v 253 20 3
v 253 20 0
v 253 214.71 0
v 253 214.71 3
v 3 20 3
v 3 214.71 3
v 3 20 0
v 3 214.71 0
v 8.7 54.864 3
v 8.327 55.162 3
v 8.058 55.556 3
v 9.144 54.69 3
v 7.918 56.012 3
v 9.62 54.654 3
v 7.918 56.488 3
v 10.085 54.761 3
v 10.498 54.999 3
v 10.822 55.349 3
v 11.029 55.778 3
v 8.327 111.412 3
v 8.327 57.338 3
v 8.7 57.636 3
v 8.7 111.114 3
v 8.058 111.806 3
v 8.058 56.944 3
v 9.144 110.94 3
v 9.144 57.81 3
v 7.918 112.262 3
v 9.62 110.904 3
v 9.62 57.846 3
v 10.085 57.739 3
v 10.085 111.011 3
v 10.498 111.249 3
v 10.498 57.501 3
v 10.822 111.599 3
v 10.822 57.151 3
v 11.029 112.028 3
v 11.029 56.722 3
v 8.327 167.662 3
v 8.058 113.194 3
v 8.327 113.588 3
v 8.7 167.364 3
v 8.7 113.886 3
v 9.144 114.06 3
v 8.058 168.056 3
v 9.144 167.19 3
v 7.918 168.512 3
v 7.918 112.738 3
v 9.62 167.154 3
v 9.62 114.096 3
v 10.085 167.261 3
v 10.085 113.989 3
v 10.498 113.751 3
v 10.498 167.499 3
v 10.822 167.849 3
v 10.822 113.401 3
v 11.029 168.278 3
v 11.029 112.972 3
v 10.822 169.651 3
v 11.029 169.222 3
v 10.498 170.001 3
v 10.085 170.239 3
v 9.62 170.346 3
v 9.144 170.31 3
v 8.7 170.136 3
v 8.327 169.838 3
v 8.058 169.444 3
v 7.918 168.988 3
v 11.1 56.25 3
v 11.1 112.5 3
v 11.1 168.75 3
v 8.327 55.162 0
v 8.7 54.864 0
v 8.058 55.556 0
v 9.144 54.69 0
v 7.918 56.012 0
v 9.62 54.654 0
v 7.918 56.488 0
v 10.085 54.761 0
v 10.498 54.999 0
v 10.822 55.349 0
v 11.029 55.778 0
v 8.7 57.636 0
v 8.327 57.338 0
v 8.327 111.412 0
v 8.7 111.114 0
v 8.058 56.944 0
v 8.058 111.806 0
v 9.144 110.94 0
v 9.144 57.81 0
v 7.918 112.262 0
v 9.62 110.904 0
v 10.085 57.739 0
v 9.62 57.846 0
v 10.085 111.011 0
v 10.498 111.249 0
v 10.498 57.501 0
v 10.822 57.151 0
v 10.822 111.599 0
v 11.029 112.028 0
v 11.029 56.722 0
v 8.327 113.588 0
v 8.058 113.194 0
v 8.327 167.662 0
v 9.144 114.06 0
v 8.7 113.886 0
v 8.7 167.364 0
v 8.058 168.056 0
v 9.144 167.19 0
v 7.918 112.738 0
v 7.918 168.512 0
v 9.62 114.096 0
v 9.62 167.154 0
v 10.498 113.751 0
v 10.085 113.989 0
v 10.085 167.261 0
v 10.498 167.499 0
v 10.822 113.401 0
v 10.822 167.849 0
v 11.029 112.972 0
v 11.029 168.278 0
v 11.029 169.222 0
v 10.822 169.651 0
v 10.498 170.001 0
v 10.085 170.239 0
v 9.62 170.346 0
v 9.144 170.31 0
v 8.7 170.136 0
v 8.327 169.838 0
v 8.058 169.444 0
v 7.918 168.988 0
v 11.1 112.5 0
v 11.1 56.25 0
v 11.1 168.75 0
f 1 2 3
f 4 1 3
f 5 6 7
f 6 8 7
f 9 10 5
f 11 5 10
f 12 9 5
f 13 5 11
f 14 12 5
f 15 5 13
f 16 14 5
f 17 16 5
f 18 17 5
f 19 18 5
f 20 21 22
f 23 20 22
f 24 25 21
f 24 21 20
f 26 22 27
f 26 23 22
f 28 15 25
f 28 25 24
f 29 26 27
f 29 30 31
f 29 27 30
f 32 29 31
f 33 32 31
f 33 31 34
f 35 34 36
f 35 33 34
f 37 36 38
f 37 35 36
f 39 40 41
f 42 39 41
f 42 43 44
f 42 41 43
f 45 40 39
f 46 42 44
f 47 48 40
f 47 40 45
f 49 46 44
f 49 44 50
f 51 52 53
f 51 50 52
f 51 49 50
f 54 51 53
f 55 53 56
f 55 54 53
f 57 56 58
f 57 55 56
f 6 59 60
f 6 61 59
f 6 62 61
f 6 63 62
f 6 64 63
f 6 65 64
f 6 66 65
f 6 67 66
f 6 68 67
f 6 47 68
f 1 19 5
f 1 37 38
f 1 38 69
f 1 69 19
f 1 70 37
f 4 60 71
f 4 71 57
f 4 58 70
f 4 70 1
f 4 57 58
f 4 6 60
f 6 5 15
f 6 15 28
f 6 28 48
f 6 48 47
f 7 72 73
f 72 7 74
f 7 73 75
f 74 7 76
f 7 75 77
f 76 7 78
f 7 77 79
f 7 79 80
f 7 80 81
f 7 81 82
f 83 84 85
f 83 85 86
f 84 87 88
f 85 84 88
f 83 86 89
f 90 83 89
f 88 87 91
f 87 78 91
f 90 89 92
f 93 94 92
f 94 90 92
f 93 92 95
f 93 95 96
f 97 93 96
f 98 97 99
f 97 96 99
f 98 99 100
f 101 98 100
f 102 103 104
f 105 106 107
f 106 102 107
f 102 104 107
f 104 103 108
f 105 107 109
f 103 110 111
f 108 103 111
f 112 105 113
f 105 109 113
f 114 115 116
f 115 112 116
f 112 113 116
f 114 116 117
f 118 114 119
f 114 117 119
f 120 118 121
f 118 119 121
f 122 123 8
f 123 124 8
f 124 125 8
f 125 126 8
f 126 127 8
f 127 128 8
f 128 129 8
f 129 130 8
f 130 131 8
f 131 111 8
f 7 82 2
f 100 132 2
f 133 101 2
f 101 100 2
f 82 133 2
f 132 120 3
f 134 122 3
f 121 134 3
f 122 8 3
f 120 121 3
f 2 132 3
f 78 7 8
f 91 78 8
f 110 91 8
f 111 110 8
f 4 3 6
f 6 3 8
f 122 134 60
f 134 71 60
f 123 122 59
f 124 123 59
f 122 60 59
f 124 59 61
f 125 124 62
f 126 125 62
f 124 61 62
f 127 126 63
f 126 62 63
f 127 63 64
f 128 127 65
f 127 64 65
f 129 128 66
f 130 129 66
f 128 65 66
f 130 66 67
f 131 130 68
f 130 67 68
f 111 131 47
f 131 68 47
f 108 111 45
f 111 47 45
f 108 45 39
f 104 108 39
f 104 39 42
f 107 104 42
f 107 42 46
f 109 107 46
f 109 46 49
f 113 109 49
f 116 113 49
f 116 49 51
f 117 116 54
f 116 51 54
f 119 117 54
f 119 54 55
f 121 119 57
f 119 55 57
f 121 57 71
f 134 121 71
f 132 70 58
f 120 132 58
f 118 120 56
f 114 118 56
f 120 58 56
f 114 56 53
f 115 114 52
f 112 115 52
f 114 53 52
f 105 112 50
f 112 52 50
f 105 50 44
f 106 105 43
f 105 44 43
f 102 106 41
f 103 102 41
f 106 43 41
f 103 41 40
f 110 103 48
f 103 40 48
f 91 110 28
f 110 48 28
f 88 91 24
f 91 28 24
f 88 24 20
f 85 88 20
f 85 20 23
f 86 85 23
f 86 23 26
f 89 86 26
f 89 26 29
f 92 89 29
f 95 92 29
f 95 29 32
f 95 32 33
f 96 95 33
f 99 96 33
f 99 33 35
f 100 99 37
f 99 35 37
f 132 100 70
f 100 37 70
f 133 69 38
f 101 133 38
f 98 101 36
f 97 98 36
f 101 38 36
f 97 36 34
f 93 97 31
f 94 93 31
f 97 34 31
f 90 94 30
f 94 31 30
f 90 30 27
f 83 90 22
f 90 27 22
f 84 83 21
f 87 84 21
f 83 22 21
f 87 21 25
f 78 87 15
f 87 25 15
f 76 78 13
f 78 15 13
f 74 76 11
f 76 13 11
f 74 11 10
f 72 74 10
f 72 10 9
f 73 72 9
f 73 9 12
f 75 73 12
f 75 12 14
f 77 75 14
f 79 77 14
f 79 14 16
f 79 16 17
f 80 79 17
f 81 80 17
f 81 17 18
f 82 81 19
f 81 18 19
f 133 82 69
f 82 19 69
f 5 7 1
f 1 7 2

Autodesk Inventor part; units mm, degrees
ref_plane "YZ Plane" through (0, 0, 0) normal (1, 0, 0) x (0, 1, 0)
ref_plane "XZ Plane" through (0, 0, 0) normal (0, 1, 0) x (-1, 0, 0)
ref_plane "XY Plane" through (0, 0, 0) normal (0, 0, 1) x (1, 0, 0)
ref_plane "Work Plane1" through (0, 0, 0) normal (0, 0, 1) x (1, 0, 0)
sketch "Sketch1" plane through (0, 0, 0) normal (0, 0, 1) x (1, 0, 0)
  line L0 (3, 20) -> (253, 20)
  line L1 (253, 20) -> (253, 214.71)
  line L2 (253, 214.71) -> (3, 214.71)
  line L3 (3, 214.71) -> (3, 20)
  circle A0 centre (9.5, 56.25) radius 1.6 construction
  circle A1 centre (9.5, 112.5) radius 1.6 construction
  circle A2 centre (9.5, 168.75) radius 1.6 construction
  line L4 (19, 225) -> (19, 0) construction
  line L5 (19, 225) -> (13.5011, 225) construction
  ellipse E0 centre (12.5333, 224.7099) end of major axis (12.5333, 225.8617) minor radius 1 (13.5333, 224.7099) -> (13.5011, 225) ccw construction
  line L6 (13.5333, 219.5971) -> (13.5333, 224.7099) construction
  ellipse E1 centre (12.5333, 219.5971) end of major axis (12.5333, 217.71) minor radius 1 (12.5333, 217.71) -> (13.5333, 219.5971) ccw construction
  line L7 (7.4667, 217.71) -> (12.5333, 217.71) construction
  ellipse E2 centre (7.4667, 219.5971) end of major axis (7.4667, 217.71) minor radius 1 (6.4667, 219.5971) -> (7.4667, 217.71) ccw construction
  line L8 (6.4667, 224.7099) -> (6.4667, 219.5971) construction
  ellipse E3 centre (7.4667, 224.7099) end of major axis (7.4667, 225.8617) minor radius 1 (6.4989, 225) -> (6.4667, 224.7099) ccw construction
  line L9 (6.4989, 225) -> (0, 225) construction
  line L10 (0, 0) -> (0, 225) construction
  line L11 (0, 0) -> (19, 0) construction
  dimension "d0" = 3
  dimension "d1" = 3
  dimension "d2" = 250
  dimension "d3" = 20
extrude "Extrusion1" add sketch "Sketch1" along normal blind 3
sketch "Sketch2" plane through (0, 0, 3) normal (0, 0, 1) x (1, 0, 0)
  circle A0 centre (9.5, 168.75) radius 1.6 projected
  circle A1 centre (9.5, 112.5) radius 1.6 projected
  circle A2 centre (9.5, 56.25) radius 1.6 projected
  point P0 (0, 0)
extrude "Extrusion2" cut sketch "Sketch2" against normal through all
equation "\"d1\" = d0"
properties part number "front-glass" material "Glass"
